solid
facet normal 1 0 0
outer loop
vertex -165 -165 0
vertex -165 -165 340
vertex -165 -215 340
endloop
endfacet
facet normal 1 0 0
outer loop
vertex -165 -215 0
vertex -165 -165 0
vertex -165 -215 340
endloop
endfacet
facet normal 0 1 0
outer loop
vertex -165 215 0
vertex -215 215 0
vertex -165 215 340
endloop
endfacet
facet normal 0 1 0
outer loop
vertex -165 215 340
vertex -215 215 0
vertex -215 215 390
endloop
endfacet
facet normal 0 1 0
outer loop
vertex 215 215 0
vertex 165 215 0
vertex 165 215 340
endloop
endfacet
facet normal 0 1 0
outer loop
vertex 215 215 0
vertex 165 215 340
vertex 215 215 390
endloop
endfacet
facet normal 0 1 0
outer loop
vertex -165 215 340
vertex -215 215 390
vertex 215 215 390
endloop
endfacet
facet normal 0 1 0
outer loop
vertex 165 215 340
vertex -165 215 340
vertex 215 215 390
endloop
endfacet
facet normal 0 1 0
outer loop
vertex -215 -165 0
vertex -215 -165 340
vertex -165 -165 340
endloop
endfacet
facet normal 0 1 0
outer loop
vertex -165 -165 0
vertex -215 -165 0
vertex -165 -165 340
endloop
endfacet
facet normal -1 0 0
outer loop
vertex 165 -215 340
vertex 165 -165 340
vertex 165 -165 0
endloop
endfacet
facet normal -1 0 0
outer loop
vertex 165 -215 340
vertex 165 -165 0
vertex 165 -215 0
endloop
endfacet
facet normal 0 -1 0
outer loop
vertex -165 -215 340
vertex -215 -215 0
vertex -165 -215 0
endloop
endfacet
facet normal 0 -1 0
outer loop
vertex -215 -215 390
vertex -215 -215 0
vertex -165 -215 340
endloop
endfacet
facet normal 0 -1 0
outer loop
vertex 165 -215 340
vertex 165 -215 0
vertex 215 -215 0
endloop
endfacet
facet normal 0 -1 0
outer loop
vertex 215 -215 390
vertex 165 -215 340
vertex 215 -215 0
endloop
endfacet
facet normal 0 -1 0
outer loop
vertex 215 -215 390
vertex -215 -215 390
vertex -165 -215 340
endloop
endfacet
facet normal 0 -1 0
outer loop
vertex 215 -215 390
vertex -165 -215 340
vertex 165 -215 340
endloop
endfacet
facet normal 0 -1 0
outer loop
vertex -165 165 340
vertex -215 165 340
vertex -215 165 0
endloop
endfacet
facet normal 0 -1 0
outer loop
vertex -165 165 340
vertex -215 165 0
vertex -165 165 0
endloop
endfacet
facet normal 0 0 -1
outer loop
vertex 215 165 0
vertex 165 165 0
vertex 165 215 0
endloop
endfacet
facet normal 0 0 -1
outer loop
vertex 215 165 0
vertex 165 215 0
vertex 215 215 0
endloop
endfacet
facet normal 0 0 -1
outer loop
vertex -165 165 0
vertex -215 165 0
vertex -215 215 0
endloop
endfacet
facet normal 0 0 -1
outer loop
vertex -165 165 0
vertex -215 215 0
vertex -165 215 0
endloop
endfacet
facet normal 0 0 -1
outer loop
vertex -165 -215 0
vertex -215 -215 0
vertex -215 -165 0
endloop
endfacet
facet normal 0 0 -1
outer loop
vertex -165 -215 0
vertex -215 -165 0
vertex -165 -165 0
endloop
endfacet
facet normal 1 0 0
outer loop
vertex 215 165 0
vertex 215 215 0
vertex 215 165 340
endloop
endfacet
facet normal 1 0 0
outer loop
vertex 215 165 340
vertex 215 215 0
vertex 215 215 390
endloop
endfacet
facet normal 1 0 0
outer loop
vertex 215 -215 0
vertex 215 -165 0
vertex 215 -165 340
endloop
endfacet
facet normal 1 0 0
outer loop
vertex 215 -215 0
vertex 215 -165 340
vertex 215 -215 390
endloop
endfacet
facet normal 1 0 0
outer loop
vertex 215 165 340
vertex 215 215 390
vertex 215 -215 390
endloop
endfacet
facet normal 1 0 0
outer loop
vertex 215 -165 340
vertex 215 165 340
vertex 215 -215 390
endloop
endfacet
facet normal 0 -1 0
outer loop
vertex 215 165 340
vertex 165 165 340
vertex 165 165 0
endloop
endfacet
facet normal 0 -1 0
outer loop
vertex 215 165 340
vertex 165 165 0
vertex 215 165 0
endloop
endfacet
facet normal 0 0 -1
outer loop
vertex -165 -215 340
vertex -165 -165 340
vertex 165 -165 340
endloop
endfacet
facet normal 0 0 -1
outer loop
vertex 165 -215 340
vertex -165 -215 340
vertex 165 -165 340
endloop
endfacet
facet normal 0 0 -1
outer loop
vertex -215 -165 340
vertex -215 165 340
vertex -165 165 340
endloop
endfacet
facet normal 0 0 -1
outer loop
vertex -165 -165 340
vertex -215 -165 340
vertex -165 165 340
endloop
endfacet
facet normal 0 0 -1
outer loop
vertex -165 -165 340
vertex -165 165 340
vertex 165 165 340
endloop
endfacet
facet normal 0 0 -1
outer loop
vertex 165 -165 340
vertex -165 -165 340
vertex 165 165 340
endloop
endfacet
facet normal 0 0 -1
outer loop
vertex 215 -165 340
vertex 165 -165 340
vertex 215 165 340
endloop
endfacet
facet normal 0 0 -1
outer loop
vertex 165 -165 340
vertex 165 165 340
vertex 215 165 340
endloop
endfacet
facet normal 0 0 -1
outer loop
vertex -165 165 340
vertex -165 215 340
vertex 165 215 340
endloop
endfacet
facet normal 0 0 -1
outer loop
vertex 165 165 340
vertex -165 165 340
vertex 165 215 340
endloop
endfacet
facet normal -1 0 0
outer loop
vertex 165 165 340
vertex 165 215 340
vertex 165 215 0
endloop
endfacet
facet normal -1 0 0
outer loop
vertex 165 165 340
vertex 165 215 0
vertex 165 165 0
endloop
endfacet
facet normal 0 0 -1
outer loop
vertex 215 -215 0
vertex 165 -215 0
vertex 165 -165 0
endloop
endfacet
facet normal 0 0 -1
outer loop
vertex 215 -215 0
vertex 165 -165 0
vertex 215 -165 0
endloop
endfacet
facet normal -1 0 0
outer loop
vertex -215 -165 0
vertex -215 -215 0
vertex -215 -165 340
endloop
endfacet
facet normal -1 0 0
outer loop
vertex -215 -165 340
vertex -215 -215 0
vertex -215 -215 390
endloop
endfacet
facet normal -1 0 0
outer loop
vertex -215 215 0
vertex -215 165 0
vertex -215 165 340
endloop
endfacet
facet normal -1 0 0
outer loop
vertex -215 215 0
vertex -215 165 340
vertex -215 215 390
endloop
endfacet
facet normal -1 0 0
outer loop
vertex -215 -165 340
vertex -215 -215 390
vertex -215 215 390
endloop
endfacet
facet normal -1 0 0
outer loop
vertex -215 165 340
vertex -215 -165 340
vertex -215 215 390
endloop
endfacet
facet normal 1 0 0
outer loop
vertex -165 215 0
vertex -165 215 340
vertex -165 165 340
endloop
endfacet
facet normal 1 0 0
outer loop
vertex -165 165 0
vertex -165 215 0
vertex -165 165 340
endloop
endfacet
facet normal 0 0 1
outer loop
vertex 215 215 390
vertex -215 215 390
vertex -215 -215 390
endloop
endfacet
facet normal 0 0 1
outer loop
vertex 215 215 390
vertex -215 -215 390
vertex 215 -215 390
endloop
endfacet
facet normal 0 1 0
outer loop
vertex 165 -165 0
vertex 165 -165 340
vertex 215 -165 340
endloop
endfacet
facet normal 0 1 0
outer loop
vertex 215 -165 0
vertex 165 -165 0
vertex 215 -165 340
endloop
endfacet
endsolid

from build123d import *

# Parameters (mm, degrees)
F1_W     = 430
F1_H     = 430
F2_DEPTH = 50
F3_W     = 50
F3_H     = 50
F4_DEPTH = 340


with BuildPart() as f2:
    # F1 (on offset) → F2 (new body)
    with BuildSketch(Plane.XY.offset(390)):
        Rectangle(F1_W, F1_H)
    extrude(amount=-F2_DEPTH)

    # F3 (on face) → F4 (join, through all)
    with BuildSketch(Plane(origin=(0, 0, 340), x_dir=(1, 0, 0), z_dir=(0, 0, -1))):
        with Locations((190, 190)):
            Rectangle(F3_W, F3_H)
        with Locations((-190, 190)):
            Rectangle(F3_W, F3_H)
        with Locations((-190, -190)):
            Rectangle(F3_W, F3_H)
        with Locations((190, -190)):
            Rectangle(F3_W, F3_H)
    extrude(amount=F4_DEPTH)


solid = f2.part
